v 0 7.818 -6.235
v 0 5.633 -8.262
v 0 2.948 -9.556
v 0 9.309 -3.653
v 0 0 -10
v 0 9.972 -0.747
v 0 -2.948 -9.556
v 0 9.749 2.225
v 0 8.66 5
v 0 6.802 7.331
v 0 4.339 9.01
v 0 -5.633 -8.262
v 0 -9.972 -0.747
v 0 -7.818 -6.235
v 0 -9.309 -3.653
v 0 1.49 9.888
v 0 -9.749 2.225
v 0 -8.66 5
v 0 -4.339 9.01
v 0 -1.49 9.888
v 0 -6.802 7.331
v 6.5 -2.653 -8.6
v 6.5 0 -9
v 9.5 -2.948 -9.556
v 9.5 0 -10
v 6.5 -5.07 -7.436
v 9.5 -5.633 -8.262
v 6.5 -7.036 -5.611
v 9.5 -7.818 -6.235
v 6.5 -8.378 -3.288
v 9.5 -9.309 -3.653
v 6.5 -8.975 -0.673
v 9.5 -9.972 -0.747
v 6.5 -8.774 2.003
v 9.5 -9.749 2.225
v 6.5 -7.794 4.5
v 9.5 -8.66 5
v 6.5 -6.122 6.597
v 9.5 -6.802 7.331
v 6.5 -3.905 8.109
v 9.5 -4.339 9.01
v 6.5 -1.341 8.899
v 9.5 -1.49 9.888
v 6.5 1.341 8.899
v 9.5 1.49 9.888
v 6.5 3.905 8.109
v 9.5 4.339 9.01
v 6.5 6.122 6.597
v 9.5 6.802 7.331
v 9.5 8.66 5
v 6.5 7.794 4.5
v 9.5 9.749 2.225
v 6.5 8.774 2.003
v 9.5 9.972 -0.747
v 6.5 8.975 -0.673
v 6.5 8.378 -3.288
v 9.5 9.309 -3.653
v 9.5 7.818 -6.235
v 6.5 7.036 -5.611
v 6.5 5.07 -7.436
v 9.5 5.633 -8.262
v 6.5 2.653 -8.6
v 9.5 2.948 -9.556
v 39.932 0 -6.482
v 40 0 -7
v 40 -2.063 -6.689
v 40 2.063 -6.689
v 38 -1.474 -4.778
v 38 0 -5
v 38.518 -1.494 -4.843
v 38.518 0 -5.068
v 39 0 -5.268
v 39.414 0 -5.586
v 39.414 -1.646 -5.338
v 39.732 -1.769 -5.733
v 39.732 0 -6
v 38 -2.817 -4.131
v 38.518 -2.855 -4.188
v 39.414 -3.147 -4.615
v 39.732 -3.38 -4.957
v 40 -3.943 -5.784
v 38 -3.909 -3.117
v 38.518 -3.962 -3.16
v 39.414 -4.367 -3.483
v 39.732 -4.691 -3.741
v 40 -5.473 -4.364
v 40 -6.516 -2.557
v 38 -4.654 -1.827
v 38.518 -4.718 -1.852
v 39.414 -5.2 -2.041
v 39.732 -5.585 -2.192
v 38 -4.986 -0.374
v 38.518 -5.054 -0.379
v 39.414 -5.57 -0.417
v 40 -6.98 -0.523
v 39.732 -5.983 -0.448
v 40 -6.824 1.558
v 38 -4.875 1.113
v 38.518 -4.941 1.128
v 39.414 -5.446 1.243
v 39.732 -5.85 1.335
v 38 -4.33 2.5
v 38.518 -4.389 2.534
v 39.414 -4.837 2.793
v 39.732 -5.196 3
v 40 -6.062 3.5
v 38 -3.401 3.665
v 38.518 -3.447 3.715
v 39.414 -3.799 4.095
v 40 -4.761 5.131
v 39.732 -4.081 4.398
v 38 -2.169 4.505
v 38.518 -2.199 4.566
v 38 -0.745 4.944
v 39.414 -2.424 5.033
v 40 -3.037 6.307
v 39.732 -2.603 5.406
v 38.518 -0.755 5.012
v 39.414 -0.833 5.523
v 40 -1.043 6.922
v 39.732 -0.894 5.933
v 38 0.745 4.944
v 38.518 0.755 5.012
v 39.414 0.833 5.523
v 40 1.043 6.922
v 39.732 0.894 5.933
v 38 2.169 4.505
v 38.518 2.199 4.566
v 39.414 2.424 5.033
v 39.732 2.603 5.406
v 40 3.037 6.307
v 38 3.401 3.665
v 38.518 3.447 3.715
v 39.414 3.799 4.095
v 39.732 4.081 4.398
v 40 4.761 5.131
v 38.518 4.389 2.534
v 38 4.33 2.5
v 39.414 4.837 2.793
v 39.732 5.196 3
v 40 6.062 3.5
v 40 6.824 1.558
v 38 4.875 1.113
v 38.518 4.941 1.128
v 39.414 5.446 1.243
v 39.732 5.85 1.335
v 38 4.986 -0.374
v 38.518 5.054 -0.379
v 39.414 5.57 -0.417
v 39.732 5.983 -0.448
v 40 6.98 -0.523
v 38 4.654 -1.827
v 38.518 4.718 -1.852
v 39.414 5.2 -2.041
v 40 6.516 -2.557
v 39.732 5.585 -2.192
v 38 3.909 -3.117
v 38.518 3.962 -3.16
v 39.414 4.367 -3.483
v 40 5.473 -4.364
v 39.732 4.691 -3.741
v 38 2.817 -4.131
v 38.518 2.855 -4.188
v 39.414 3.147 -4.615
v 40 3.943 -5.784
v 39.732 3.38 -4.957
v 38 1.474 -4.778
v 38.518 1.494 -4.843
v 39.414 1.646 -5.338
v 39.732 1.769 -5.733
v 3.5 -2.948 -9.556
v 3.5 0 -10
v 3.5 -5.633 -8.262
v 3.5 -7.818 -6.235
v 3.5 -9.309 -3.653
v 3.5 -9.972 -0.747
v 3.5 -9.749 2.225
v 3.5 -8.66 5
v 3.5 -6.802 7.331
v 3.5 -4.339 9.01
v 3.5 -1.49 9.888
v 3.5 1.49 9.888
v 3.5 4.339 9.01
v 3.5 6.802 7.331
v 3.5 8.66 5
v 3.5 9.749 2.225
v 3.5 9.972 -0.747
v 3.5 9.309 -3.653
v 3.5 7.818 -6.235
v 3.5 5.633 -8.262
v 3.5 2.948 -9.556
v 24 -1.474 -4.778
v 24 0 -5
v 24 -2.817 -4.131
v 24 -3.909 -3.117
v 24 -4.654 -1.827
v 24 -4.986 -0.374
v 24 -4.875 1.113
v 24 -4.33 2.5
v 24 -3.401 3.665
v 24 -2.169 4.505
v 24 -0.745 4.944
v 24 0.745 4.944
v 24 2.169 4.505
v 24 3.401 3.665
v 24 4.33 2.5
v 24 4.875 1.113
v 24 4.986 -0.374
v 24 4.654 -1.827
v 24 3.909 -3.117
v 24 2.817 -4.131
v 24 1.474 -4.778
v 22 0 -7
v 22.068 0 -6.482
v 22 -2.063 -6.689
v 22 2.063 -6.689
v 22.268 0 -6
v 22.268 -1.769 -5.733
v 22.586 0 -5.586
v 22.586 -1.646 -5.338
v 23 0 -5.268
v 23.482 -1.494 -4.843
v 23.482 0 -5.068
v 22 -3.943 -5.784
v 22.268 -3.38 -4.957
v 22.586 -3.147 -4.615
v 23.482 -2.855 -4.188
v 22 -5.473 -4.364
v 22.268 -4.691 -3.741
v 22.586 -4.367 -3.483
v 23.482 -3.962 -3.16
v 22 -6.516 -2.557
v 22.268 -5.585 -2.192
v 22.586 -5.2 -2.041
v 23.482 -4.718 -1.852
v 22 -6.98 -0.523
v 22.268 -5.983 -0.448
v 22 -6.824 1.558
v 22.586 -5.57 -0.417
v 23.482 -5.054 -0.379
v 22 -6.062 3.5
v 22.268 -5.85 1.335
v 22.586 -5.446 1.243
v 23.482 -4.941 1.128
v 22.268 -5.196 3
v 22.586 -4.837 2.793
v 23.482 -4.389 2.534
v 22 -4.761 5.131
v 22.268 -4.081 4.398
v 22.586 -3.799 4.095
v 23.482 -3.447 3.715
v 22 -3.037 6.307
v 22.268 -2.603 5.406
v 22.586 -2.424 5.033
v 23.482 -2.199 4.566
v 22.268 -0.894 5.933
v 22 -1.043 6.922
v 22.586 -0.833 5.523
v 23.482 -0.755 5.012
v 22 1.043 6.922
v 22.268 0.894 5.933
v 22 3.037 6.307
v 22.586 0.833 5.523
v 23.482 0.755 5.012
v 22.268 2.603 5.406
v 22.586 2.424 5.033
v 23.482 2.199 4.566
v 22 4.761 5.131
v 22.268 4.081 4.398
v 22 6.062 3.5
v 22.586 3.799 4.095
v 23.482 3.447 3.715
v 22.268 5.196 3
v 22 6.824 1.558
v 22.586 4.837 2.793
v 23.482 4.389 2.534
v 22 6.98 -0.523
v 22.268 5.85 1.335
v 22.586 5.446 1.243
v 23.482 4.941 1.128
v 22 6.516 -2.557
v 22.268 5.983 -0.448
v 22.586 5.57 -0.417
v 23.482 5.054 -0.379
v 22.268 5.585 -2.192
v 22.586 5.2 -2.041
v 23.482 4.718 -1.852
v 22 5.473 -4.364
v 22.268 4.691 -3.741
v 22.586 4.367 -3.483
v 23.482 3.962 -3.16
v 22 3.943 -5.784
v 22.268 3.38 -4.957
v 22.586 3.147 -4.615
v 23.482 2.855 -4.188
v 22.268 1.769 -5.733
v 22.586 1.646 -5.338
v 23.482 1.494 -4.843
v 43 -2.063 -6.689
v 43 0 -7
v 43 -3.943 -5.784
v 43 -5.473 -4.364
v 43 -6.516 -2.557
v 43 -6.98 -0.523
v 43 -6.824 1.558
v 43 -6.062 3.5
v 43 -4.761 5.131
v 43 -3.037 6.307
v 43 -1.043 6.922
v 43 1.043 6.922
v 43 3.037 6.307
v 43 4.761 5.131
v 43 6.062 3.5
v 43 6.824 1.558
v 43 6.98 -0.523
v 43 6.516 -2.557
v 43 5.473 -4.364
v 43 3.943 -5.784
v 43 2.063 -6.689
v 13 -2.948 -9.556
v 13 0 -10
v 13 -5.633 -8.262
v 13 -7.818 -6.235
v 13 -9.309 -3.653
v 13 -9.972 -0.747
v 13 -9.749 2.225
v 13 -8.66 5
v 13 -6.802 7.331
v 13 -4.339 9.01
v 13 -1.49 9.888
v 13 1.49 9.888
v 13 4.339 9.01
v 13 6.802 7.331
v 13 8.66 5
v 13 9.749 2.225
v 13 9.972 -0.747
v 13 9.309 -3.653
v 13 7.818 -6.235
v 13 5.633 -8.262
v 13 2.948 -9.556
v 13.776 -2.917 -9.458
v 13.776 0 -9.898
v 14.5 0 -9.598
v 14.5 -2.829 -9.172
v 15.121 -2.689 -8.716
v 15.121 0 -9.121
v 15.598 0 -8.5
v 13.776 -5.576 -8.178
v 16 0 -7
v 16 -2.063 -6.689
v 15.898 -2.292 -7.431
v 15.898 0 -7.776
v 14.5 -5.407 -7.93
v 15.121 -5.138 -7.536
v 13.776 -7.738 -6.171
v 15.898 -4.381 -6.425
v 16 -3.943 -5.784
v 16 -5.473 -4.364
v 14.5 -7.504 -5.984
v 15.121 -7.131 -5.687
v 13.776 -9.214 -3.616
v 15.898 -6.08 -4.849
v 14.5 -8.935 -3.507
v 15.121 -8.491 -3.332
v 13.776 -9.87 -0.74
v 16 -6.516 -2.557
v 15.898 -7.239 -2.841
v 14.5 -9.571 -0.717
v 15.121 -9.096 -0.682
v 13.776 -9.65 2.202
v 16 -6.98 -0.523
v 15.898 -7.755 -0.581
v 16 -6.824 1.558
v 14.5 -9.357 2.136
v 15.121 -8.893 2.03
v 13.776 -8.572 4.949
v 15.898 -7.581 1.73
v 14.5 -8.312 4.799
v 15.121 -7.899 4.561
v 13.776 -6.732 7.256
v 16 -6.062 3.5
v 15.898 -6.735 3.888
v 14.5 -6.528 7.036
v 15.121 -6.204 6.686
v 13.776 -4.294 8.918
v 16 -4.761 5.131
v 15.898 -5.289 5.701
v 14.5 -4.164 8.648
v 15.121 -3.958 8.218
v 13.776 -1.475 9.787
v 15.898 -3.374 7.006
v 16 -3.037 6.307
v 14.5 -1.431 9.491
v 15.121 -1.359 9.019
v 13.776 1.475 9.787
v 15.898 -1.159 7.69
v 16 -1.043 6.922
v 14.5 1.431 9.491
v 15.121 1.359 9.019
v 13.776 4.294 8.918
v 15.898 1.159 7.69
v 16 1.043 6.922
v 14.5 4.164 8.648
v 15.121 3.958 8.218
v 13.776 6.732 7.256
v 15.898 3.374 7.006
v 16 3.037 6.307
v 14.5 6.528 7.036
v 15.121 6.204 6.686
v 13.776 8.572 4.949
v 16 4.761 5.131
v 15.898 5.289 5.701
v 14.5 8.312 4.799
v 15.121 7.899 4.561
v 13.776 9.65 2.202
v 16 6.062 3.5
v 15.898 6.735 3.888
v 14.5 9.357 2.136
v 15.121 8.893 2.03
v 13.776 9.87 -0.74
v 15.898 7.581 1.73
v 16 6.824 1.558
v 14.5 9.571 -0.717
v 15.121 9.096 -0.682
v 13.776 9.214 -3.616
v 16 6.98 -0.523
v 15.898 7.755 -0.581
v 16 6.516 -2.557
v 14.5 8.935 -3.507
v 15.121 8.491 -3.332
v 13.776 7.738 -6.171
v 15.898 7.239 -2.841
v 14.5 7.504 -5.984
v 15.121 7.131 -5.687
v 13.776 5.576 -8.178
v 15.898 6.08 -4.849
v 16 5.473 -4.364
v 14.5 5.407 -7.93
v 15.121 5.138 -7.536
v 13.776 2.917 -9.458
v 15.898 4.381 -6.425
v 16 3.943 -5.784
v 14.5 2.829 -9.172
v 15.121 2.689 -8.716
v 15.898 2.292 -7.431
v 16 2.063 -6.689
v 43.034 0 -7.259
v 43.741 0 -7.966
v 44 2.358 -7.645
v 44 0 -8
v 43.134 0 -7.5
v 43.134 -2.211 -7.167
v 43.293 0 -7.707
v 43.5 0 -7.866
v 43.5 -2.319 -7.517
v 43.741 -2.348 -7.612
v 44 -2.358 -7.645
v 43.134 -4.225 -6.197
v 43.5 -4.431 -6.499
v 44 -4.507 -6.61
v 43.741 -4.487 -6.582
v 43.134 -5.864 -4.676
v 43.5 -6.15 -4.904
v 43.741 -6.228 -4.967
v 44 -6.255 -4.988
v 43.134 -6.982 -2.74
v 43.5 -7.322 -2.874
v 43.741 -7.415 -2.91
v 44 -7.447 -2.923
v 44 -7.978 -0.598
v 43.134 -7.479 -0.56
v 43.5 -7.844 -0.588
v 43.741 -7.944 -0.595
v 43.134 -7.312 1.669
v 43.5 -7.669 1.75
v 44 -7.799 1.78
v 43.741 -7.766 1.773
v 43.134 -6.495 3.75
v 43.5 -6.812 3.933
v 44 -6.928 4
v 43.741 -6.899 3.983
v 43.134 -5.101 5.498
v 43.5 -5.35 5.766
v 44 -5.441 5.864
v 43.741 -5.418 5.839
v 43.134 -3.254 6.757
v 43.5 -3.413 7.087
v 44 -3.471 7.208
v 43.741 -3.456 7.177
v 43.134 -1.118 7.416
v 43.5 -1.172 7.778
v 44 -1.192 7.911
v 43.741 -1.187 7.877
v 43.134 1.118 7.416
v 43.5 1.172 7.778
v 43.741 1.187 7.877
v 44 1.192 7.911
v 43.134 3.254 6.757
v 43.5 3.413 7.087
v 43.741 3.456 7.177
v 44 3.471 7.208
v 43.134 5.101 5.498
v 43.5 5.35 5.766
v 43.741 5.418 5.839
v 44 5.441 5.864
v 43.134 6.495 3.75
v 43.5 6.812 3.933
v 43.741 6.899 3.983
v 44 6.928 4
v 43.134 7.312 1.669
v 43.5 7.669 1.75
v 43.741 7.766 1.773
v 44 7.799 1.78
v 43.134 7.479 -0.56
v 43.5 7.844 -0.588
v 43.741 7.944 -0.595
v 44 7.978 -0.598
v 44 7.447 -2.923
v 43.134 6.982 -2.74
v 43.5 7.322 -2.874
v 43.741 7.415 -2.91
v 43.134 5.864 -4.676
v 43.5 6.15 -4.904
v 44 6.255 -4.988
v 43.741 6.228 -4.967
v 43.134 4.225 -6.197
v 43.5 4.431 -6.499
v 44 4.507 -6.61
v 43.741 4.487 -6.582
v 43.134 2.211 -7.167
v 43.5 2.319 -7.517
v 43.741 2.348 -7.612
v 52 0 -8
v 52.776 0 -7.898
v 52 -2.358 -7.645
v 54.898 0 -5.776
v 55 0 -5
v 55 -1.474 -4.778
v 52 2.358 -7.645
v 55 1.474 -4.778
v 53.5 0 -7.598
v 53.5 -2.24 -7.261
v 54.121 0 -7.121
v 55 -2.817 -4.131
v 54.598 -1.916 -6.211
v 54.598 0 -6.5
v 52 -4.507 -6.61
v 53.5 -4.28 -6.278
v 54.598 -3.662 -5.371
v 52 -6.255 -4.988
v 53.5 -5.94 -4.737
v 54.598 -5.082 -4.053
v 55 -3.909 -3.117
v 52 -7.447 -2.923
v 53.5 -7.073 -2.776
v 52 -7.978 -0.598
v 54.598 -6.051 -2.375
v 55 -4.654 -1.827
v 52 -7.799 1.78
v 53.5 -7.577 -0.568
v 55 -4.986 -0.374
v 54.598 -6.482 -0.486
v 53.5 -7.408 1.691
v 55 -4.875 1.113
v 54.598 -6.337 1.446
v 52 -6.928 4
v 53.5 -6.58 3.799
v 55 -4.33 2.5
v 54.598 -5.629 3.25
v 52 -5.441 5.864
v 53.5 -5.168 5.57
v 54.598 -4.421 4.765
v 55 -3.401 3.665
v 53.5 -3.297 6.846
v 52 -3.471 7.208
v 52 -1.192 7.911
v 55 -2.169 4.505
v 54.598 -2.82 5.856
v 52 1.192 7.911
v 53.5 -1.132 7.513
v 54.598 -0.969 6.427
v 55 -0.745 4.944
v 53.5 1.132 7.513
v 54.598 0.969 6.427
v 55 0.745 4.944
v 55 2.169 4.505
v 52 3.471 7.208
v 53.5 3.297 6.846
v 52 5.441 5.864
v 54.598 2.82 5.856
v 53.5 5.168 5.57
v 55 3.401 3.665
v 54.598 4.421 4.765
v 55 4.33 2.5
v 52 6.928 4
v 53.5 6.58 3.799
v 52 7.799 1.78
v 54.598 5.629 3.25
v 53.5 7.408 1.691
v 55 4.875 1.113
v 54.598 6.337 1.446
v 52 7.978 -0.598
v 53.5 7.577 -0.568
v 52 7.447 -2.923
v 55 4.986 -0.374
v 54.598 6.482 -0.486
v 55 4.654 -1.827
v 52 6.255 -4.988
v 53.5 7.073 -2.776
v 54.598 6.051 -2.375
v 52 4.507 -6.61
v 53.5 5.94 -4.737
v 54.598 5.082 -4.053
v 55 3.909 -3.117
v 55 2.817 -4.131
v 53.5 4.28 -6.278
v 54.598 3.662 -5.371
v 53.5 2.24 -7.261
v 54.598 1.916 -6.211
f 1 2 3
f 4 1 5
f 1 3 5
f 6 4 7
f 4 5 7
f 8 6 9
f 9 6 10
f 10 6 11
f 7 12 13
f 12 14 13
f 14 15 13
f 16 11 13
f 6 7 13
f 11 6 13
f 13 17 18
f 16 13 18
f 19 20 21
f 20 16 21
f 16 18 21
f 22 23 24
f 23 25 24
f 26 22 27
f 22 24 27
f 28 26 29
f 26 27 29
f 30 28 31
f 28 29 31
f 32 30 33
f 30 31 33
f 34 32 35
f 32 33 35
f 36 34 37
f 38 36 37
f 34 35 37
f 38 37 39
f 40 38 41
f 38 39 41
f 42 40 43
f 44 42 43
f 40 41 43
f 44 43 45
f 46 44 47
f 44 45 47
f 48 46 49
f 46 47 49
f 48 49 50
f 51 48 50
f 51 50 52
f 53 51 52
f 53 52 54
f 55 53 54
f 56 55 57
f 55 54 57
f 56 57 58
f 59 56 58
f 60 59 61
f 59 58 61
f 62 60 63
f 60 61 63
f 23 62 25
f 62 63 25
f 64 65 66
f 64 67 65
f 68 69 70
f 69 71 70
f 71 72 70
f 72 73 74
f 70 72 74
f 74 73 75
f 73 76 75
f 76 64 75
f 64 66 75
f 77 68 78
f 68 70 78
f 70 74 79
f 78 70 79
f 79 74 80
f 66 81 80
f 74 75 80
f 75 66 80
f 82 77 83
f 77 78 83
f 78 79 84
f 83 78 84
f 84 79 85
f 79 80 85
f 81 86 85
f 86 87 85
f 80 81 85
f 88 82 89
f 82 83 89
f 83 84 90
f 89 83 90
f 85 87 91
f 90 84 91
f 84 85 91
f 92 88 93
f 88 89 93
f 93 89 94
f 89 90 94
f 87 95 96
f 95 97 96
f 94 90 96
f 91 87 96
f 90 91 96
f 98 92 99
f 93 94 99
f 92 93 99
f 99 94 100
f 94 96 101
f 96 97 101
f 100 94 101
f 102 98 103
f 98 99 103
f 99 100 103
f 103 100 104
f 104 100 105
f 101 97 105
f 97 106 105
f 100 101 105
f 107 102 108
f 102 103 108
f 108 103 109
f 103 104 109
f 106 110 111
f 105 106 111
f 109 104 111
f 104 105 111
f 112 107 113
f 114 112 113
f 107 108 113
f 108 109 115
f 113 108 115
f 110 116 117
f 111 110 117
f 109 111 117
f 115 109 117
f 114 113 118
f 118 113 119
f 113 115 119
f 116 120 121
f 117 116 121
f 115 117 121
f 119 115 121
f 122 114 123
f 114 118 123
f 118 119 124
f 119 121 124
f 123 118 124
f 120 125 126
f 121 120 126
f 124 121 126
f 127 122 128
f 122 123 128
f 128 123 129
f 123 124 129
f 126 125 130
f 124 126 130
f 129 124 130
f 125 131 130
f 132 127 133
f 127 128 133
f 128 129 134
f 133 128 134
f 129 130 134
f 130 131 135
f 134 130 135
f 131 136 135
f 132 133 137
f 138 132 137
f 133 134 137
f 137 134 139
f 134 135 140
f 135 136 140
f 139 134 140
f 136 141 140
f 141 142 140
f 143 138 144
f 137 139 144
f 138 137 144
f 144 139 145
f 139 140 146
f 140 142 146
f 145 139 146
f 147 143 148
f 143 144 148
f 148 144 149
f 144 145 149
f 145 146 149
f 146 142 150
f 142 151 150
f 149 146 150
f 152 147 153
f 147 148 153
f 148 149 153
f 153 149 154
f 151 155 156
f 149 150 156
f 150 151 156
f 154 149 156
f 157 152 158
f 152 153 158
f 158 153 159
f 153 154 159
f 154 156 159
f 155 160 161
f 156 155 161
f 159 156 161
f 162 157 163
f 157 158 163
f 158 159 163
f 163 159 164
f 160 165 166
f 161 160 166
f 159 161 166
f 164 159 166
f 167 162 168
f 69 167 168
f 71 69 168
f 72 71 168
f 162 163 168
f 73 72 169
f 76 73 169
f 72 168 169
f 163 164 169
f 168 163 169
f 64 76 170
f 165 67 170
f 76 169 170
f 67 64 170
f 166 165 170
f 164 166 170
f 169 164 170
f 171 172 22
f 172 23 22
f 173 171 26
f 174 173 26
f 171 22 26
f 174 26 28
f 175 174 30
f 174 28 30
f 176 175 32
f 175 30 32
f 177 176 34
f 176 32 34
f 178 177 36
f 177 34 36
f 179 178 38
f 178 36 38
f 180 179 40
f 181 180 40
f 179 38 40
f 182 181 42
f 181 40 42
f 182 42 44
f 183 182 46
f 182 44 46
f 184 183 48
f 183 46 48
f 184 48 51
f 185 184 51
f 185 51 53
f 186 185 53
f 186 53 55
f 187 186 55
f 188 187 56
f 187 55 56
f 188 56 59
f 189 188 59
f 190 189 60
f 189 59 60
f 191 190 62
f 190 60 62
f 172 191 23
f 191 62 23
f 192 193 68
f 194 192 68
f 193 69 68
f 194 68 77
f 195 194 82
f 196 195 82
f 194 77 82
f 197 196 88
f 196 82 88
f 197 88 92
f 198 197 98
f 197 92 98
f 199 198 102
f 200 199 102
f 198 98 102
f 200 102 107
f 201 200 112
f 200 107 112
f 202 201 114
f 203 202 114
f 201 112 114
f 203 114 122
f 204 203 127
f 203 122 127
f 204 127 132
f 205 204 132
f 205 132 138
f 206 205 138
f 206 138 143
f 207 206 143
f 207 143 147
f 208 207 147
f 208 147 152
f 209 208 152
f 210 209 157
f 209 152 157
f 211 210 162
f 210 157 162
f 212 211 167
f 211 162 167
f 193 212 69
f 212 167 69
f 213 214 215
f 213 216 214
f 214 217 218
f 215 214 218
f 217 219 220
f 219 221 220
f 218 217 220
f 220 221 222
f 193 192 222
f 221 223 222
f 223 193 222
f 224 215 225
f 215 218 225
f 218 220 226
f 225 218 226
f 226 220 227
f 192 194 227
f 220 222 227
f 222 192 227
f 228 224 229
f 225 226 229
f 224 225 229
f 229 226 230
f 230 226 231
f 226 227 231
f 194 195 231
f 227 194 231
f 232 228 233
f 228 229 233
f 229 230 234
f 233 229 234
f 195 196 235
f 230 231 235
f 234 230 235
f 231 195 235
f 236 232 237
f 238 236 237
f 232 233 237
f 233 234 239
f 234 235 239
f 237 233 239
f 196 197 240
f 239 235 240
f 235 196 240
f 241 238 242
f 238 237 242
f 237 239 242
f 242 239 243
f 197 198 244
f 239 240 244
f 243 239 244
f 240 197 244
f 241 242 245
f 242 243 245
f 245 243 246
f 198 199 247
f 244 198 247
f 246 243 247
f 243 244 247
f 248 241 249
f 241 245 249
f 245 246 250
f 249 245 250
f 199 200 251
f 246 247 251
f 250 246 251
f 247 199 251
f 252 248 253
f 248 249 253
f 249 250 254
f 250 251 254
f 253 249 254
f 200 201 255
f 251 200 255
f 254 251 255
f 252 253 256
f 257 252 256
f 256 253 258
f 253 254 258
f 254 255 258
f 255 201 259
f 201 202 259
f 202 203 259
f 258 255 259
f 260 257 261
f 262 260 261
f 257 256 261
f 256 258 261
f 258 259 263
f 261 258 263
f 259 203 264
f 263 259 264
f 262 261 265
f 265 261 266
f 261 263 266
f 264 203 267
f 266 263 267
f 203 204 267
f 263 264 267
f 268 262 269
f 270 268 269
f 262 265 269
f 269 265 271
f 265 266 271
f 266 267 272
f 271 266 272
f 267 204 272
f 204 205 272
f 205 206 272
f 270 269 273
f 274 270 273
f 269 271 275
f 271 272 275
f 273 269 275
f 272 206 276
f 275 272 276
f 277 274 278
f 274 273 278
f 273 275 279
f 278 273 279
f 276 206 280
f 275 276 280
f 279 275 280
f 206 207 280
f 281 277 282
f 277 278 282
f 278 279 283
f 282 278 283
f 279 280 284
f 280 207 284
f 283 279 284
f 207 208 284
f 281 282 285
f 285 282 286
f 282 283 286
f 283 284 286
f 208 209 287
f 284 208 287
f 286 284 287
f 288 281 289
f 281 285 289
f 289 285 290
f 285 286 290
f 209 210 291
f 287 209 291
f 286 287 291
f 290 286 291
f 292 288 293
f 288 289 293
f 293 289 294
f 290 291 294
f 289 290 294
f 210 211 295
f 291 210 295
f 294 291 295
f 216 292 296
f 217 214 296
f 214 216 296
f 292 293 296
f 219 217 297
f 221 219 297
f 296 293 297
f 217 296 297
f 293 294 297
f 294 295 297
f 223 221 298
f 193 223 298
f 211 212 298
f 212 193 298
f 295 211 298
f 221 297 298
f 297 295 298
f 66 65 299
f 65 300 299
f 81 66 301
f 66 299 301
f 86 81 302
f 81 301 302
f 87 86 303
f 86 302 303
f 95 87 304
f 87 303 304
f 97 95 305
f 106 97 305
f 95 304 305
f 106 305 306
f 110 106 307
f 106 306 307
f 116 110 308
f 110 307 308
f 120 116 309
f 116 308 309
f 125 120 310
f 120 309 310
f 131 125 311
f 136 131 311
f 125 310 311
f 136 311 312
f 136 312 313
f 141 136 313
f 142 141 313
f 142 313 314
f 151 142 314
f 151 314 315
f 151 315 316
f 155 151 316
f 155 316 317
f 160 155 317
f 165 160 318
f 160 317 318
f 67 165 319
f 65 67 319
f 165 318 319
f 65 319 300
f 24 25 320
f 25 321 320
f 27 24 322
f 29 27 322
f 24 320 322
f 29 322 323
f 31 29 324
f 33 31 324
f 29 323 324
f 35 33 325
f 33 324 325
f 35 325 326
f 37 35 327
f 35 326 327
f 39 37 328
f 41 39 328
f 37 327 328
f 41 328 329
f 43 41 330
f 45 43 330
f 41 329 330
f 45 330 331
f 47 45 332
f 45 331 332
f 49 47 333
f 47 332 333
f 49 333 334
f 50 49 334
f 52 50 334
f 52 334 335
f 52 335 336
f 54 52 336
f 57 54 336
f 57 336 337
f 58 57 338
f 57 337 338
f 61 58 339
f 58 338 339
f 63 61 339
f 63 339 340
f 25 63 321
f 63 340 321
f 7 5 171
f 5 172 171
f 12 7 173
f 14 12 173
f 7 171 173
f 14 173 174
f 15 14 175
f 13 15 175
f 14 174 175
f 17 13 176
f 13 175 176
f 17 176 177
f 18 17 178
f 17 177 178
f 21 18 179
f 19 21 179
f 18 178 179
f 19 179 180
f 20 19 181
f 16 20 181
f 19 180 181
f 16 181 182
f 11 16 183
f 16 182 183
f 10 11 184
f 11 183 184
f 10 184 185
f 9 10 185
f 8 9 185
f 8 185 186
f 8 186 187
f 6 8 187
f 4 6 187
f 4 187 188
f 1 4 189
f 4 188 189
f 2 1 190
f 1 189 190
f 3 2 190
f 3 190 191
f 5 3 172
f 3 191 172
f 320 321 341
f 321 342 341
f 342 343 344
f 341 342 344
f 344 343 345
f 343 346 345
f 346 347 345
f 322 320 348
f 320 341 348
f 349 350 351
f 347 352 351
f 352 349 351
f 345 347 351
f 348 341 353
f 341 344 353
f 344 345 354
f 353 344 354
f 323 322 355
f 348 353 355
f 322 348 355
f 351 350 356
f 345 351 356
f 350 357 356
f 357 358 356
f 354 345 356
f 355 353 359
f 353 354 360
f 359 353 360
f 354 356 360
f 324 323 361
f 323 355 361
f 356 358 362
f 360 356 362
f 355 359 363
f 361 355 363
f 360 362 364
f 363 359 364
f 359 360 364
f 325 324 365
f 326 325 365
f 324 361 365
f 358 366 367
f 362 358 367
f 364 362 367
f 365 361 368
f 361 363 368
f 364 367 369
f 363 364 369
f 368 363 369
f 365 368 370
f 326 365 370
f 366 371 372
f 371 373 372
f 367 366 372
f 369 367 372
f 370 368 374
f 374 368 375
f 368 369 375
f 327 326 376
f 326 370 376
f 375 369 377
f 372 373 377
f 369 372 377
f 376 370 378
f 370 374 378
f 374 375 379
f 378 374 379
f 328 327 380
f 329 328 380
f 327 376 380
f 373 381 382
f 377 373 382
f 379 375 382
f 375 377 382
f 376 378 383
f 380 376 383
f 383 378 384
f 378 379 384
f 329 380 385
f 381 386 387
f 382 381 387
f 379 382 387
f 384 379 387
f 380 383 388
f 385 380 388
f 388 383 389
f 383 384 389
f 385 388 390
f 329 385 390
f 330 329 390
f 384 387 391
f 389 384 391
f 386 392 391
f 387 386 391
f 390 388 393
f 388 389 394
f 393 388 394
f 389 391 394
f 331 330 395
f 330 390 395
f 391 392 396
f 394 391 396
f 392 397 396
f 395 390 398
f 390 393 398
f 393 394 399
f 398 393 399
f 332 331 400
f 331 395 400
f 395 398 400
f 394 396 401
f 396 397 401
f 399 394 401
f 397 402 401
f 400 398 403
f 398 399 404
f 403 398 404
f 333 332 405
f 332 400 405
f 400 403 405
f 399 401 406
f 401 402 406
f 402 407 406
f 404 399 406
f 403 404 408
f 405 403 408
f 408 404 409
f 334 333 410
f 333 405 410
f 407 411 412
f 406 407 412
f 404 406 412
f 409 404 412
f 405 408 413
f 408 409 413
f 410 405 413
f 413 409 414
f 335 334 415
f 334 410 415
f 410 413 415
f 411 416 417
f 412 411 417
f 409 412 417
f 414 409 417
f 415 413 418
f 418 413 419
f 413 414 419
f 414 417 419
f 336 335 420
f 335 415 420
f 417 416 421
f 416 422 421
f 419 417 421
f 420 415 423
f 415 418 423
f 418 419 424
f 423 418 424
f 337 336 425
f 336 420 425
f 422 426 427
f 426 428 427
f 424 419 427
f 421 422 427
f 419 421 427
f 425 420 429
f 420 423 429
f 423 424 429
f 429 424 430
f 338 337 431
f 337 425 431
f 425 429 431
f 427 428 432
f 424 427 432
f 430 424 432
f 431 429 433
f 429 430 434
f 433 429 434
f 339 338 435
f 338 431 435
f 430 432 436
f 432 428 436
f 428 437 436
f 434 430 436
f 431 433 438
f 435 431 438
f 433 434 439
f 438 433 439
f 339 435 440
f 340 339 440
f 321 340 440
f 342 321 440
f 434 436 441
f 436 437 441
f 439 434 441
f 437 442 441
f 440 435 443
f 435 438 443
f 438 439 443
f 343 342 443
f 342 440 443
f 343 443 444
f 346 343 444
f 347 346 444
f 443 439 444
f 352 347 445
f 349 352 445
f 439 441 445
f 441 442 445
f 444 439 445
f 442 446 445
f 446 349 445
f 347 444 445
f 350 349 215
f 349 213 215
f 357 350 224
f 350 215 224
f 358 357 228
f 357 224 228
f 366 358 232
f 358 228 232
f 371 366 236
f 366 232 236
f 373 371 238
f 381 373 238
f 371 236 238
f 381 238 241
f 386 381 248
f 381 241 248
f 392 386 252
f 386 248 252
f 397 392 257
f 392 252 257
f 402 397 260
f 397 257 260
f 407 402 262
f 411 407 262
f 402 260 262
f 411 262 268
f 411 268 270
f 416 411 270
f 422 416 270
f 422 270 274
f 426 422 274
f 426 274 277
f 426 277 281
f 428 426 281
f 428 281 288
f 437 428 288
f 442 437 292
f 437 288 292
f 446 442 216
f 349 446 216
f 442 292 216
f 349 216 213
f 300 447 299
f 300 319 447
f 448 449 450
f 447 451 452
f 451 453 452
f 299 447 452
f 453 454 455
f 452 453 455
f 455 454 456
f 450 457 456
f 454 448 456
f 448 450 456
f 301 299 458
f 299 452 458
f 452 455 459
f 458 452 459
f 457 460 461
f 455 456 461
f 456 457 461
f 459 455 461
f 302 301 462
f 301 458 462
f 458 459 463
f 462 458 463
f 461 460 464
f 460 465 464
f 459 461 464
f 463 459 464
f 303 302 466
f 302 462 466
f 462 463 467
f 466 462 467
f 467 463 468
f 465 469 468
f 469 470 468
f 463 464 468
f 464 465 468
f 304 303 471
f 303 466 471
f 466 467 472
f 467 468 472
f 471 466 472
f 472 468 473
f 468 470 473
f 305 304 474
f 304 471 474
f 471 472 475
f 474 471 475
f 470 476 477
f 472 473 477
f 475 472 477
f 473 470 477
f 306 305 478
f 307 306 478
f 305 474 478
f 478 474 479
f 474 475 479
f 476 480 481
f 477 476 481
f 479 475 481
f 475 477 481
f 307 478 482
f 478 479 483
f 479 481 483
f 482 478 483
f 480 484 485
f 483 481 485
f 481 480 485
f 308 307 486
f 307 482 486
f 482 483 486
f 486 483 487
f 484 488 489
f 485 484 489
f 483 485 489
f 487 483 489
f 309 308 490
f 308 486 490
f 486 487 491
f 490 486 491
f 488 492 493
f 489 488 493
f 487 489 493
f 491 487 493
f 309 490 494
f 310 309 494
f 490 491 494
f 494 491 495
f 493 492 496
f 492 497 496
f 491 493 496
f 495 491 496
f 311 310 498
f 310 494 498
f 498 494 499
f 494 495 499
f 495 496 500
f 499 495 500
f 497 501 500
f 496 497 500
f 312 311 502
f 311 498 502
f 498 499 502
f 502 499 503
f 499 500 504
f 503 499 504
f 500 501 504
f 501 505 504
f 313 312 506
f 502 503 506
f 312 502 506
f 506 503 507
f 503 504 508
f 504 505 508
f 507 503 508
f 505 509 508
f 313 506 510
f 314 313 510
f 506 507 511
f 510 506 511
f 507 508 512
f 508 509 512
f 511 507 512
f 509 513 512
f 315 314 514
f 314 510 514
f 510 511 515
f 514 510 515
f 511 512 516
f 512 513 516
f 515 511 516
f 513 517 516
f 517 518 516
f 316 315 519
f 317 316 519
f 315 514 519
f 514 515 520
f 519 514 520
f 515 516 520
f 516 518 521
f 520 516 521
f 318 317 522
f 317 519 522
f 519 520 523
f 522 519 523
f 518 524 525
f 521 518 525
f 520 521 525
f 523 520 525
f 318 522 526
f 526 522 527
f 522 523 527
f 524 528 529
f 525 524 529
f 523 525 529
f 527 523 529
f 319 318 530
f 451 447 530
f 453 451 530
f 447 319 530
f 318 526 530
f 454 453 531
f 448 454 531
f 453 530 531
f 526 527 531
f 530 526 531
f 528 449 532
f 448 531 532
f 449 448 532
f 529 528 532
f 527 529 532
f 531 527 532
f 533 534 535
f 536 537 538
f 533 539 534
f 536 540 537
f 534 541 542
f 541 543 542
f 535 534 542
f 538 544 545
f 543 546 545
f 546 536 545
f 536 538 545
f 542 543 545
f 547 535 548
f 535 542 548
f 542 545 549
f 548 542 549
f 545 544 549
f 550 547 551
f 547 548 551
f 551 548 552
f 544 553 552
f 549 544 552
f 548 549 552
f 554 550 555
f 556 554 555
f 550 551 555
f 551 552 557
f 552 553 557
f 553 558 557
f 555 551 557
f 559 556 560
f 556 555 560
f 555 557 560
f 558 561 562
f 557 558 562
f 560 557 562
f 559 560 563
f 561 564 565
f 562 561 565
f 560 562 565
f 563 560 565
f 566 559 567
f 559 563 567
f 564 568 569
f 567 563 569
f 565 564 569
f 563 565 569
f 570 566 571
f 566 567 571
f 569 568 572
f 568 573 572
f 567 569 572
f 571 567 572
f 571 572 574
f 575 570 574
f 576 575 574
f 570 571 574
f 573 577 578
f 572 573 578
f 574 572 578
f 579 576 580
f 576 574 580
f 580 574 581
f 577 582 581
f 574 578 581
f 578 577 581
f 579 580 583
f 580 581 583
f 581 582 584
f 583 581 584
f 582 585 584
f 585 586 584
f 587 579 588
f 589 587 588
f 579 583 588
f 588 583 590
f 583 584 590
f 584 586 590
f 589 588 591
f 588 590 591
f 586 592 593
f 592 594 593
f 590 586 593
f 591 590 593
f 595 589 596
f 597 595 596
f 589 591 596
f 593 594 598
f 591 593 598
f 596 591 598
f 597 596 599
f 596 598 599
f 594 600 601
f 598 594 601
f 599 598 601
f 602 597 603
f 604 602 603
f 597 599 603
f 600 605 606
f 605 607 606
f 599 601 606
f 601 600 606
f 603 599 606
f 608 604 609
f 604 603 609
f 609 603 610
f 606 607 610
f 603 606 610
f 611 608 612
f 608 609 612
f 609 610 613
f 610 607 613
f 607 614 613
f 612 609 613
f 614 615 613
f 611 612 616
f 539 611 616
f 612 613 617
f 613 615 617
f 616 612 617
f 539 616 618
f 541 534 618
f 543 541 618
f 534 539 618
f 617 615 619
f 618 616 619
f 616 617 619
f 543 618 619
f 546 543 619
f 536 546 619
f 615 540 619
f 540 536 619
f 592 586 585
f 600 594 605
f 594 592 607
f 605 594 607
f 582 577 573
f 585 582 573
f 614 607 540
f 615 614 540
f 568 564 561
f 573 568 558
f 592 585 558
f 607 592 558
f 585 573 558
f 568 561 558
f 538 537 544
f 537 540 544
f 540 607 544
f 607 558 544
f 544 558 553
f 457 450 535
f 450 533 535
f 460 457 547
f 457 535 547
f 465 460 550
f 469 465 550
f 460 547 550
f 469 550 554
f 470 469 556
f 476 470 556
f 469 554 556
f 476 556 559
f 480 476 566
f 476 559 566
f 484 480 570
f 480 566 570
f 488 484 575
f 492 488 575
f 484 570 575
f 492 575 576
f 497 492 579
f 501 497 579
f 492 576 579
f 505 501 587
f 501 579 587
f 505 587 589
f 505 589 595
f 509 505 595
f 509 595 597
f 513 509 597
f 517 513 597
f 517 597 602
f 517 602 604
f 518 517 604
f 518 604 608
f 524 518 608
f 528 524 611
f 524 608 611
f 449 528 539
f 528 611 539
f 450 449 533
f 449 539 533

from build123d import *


with BuildPart() as f1:
    # F0 (on Front) → F1 (revolve)
    with BuildSketch(Plane.XZ):
        with BuildLine():
            Line((55, 0), (0, 0))
            Line((0, 0), (0, -10))
            Line((0, -10), (3.5, -10))
            Line((3.5, -10), (6.5, -9))
            Line((6.5, -9), (9.5, -10))
            Line((9.5, -10), (13, -10))
            ThreePointArc((13, -10), (15.12132, -9.12132), (16, -7))
            Line((16, -7), (22, -7))
            ThreePointArc((22, -7), (22.585786, -5.585786), (24, -5))
            Line((24, -5), (38, -5))
            ThreePointArc((38, -5), (39.414214, -5.585786), (40, -7))
            Line((40, -7), (43, -7))
            ThreePointArc((43, -7), (43.292893, -7.707107), (44, -8))
            Line((44, -8), (52, -8))
            ThreePointArc((52, -8), (54.12132, -7.12132), (55, -5))
            Line((55, -5), (55, 0))
        make_face()
    revolve(axis=Axis((24.909981, 0, 0), (-1, 0, 0)))


solid = f1.part
